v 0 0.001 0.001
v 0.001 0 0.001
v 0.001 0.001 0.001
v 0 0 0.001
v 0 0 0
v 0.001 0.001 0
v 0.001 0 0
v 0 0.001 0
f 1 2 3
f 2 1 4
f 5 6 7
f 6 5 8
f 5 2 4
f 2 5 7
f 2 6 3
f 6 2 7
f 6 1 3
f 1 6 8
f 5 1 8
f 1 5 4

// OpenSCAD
// t_check — the positive side of the analytic guards. The negative side lives in
// tests/guards/, since an assert that fires cannot be caught from inside OpenSCAD.

use <../src/uniTube.scad>;

prof = ut_round(od=12, wall=2);
assert(abs(ut_prof_reach(prof) - 6) < 1e-9, "a round profile reaches od/2 from the centreline");

// Reach is a property of the OUTLINE, not of od -- an arbitrary section is
// measured, not assumed.
sq = ut_profile(ut_ring(6, 32), ut_ring(4, 32), [["od", 12]]);
assert(abs(ut_prof_reach(sq) - 6) < 1e-6, "reach measures the farthest vertex");

// CHECK-1 passes comfortably here: r=15 against a reach of 6.
ok = ut_polyline([[0, 0, 0], [50, 0, 0], [50, 50, 0]], r=15);
assert(ut_check(ok, prof), "a well-proportioned bend passes");

// The boundary: r must be STRICTLY greater than the reach. r = 6.0001 passes,
// r = 4 aborts (tests/guards/g_check_bend.scad). At r == reach the inner
// extremity of the swept surface collapses onto the bend axis.
edge = ut_polyline([[0, 0, 0], [50, 0, 0], [50, 50, 0]], r=6.0001);
assert(ut_check(edge, prof), "just above the reach is legal");

// A straight run has no arcs, so CHECK-1 has nothing to say.
assert(ut_check(ut_polyline([[0, 0, 0], [30, 0, 0]]), prof), "a straight run always passes");

cube(0.001); // sentinel
